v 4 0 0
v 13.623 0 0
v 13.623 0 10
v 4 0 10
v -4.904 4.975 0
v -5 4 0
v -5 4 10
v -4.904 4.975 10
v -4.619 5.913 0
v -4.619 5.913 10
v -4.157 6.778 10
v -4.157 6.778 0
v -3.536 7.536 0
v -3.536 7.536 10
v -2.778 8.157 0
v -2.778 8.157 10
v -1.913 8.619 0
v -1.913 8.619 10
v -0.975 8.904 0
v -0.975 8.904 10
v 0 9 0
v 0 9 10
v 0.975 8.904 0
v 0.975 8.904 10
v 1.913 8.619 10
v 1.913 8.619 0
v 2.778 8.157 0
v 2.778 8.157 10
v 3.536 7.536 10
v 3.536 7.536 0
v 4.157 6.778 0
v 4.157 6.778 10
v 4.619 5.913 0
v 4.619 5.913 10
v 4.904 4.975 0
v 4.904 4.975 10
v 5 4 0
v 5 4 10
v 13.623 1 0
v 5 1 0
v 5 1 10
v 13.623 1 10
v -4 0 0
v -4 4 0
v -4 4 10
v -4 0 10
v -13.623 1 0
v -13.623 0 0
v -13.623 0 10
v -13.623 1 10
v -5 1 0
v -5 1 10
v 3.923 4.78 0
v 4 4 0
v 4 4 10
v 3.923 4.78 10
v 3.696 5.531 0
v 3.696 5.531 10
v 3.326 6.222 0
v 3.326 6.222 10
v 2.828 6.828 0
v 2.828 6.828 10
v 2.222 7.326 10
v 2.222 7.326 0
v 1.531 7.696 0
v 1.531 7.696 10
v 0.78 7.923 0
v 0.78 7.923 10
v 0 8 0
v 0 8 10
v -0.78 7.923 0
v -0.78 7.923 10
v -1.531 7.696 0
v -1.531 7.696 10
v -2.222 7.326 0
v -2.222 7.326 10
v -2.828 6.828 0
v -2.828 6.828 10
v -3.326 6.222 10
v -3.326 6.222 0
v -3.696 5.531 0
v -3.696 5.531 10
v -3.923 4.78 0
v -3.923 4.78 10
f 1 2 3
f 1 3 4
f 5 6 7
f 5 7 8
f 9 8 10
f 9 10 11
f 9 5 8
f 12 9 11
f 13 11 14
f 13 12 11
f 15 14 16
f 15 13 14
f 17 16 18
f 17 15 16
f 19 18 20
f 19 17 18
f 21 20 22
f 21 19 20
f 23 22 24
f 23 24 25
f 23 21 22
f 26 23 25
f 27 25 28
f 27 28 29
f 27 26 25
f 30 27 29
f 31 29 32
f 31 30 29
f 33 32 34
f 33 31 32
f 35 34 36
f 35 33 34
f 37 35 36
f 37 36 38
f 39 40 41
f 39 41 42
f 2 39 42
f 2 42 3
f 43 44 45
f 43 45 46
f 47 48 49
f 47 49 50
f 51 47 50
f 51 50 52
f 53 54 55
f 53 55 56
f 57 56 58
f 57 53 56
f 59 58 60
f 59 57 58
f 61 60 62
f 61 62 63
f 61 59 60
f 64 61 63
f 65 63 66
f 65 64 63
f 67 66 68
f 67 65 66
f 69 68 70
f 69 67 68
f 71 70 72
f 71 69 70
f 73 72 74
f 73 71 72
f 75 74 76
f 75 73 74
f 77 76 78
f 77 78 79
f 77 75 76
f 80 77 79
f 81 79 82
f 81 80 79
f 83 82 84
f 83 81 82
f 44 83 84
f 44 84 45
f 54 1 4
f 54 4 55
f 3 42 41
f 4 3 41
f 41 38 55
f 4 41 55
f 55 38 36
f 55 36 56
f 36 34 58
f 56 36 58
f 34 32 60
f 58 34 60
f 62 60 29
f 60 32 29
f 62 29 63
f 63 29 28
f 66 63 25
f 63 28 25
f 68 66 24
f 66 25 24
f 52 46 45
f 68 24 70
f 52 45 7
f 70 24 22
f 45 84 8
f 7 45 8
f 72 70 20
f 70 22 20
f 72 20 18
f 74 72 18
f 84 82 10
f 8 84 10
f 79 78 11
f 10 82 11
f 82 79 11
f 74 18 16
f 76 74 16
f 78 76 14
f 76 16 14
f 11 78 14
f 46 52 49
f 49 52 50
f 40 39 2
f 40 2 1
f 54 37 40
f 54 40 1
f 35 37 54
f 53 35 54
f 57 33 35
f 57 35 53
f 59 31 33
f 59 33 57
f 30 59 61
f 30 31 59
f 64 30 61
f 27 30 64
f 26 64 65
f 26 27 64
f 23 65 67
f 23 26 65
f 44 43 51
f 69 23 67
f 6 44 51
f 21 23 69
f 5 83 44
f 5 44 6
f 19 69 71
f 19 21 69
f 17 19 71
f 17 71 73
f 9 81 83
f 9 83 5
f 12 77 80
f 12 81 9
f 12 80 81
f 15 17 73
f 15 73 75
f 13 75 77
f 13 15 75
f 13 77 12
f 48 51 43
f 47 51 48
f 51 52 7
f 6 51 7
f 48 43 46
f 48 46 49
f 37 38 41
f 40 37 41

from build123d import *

# Parameters (mm, degrees)
EXTRUDE_1_DEPTH = 10


with BuildPart() as part:
    # 草图1 → 凸台-拉伸1 (new body)
    with BuildSketch(Plane.XY):
        with BuildLine():
            Line((5, 4), (5, 1))
            Line((5, 1), (13.623322376, 1))
            Line((13.623322376, 1), (13.623322376, 0))
            Line((13.623322376, 0), (4, 0))
            Line((4, 0), (4, 4))
            ThreePointArc((4, 4), (0, 8), (-4, 4))
            Line((-4, 4), (-4, 0))
            Line((-4, 0), (-13.623322376, 0))
            Line((-13.623322376, 0), (-13.623322376, 1))
            Line((-13.623322376, 1), (-5, 1))
            Line((-5, 1), (-5, 4))
            ThreePointArc((-5, 4), (0, 9), (5, 4))
        make_face()
    extrude(amount=EXTRUDE_1_DEPTH)


solid = part.part
